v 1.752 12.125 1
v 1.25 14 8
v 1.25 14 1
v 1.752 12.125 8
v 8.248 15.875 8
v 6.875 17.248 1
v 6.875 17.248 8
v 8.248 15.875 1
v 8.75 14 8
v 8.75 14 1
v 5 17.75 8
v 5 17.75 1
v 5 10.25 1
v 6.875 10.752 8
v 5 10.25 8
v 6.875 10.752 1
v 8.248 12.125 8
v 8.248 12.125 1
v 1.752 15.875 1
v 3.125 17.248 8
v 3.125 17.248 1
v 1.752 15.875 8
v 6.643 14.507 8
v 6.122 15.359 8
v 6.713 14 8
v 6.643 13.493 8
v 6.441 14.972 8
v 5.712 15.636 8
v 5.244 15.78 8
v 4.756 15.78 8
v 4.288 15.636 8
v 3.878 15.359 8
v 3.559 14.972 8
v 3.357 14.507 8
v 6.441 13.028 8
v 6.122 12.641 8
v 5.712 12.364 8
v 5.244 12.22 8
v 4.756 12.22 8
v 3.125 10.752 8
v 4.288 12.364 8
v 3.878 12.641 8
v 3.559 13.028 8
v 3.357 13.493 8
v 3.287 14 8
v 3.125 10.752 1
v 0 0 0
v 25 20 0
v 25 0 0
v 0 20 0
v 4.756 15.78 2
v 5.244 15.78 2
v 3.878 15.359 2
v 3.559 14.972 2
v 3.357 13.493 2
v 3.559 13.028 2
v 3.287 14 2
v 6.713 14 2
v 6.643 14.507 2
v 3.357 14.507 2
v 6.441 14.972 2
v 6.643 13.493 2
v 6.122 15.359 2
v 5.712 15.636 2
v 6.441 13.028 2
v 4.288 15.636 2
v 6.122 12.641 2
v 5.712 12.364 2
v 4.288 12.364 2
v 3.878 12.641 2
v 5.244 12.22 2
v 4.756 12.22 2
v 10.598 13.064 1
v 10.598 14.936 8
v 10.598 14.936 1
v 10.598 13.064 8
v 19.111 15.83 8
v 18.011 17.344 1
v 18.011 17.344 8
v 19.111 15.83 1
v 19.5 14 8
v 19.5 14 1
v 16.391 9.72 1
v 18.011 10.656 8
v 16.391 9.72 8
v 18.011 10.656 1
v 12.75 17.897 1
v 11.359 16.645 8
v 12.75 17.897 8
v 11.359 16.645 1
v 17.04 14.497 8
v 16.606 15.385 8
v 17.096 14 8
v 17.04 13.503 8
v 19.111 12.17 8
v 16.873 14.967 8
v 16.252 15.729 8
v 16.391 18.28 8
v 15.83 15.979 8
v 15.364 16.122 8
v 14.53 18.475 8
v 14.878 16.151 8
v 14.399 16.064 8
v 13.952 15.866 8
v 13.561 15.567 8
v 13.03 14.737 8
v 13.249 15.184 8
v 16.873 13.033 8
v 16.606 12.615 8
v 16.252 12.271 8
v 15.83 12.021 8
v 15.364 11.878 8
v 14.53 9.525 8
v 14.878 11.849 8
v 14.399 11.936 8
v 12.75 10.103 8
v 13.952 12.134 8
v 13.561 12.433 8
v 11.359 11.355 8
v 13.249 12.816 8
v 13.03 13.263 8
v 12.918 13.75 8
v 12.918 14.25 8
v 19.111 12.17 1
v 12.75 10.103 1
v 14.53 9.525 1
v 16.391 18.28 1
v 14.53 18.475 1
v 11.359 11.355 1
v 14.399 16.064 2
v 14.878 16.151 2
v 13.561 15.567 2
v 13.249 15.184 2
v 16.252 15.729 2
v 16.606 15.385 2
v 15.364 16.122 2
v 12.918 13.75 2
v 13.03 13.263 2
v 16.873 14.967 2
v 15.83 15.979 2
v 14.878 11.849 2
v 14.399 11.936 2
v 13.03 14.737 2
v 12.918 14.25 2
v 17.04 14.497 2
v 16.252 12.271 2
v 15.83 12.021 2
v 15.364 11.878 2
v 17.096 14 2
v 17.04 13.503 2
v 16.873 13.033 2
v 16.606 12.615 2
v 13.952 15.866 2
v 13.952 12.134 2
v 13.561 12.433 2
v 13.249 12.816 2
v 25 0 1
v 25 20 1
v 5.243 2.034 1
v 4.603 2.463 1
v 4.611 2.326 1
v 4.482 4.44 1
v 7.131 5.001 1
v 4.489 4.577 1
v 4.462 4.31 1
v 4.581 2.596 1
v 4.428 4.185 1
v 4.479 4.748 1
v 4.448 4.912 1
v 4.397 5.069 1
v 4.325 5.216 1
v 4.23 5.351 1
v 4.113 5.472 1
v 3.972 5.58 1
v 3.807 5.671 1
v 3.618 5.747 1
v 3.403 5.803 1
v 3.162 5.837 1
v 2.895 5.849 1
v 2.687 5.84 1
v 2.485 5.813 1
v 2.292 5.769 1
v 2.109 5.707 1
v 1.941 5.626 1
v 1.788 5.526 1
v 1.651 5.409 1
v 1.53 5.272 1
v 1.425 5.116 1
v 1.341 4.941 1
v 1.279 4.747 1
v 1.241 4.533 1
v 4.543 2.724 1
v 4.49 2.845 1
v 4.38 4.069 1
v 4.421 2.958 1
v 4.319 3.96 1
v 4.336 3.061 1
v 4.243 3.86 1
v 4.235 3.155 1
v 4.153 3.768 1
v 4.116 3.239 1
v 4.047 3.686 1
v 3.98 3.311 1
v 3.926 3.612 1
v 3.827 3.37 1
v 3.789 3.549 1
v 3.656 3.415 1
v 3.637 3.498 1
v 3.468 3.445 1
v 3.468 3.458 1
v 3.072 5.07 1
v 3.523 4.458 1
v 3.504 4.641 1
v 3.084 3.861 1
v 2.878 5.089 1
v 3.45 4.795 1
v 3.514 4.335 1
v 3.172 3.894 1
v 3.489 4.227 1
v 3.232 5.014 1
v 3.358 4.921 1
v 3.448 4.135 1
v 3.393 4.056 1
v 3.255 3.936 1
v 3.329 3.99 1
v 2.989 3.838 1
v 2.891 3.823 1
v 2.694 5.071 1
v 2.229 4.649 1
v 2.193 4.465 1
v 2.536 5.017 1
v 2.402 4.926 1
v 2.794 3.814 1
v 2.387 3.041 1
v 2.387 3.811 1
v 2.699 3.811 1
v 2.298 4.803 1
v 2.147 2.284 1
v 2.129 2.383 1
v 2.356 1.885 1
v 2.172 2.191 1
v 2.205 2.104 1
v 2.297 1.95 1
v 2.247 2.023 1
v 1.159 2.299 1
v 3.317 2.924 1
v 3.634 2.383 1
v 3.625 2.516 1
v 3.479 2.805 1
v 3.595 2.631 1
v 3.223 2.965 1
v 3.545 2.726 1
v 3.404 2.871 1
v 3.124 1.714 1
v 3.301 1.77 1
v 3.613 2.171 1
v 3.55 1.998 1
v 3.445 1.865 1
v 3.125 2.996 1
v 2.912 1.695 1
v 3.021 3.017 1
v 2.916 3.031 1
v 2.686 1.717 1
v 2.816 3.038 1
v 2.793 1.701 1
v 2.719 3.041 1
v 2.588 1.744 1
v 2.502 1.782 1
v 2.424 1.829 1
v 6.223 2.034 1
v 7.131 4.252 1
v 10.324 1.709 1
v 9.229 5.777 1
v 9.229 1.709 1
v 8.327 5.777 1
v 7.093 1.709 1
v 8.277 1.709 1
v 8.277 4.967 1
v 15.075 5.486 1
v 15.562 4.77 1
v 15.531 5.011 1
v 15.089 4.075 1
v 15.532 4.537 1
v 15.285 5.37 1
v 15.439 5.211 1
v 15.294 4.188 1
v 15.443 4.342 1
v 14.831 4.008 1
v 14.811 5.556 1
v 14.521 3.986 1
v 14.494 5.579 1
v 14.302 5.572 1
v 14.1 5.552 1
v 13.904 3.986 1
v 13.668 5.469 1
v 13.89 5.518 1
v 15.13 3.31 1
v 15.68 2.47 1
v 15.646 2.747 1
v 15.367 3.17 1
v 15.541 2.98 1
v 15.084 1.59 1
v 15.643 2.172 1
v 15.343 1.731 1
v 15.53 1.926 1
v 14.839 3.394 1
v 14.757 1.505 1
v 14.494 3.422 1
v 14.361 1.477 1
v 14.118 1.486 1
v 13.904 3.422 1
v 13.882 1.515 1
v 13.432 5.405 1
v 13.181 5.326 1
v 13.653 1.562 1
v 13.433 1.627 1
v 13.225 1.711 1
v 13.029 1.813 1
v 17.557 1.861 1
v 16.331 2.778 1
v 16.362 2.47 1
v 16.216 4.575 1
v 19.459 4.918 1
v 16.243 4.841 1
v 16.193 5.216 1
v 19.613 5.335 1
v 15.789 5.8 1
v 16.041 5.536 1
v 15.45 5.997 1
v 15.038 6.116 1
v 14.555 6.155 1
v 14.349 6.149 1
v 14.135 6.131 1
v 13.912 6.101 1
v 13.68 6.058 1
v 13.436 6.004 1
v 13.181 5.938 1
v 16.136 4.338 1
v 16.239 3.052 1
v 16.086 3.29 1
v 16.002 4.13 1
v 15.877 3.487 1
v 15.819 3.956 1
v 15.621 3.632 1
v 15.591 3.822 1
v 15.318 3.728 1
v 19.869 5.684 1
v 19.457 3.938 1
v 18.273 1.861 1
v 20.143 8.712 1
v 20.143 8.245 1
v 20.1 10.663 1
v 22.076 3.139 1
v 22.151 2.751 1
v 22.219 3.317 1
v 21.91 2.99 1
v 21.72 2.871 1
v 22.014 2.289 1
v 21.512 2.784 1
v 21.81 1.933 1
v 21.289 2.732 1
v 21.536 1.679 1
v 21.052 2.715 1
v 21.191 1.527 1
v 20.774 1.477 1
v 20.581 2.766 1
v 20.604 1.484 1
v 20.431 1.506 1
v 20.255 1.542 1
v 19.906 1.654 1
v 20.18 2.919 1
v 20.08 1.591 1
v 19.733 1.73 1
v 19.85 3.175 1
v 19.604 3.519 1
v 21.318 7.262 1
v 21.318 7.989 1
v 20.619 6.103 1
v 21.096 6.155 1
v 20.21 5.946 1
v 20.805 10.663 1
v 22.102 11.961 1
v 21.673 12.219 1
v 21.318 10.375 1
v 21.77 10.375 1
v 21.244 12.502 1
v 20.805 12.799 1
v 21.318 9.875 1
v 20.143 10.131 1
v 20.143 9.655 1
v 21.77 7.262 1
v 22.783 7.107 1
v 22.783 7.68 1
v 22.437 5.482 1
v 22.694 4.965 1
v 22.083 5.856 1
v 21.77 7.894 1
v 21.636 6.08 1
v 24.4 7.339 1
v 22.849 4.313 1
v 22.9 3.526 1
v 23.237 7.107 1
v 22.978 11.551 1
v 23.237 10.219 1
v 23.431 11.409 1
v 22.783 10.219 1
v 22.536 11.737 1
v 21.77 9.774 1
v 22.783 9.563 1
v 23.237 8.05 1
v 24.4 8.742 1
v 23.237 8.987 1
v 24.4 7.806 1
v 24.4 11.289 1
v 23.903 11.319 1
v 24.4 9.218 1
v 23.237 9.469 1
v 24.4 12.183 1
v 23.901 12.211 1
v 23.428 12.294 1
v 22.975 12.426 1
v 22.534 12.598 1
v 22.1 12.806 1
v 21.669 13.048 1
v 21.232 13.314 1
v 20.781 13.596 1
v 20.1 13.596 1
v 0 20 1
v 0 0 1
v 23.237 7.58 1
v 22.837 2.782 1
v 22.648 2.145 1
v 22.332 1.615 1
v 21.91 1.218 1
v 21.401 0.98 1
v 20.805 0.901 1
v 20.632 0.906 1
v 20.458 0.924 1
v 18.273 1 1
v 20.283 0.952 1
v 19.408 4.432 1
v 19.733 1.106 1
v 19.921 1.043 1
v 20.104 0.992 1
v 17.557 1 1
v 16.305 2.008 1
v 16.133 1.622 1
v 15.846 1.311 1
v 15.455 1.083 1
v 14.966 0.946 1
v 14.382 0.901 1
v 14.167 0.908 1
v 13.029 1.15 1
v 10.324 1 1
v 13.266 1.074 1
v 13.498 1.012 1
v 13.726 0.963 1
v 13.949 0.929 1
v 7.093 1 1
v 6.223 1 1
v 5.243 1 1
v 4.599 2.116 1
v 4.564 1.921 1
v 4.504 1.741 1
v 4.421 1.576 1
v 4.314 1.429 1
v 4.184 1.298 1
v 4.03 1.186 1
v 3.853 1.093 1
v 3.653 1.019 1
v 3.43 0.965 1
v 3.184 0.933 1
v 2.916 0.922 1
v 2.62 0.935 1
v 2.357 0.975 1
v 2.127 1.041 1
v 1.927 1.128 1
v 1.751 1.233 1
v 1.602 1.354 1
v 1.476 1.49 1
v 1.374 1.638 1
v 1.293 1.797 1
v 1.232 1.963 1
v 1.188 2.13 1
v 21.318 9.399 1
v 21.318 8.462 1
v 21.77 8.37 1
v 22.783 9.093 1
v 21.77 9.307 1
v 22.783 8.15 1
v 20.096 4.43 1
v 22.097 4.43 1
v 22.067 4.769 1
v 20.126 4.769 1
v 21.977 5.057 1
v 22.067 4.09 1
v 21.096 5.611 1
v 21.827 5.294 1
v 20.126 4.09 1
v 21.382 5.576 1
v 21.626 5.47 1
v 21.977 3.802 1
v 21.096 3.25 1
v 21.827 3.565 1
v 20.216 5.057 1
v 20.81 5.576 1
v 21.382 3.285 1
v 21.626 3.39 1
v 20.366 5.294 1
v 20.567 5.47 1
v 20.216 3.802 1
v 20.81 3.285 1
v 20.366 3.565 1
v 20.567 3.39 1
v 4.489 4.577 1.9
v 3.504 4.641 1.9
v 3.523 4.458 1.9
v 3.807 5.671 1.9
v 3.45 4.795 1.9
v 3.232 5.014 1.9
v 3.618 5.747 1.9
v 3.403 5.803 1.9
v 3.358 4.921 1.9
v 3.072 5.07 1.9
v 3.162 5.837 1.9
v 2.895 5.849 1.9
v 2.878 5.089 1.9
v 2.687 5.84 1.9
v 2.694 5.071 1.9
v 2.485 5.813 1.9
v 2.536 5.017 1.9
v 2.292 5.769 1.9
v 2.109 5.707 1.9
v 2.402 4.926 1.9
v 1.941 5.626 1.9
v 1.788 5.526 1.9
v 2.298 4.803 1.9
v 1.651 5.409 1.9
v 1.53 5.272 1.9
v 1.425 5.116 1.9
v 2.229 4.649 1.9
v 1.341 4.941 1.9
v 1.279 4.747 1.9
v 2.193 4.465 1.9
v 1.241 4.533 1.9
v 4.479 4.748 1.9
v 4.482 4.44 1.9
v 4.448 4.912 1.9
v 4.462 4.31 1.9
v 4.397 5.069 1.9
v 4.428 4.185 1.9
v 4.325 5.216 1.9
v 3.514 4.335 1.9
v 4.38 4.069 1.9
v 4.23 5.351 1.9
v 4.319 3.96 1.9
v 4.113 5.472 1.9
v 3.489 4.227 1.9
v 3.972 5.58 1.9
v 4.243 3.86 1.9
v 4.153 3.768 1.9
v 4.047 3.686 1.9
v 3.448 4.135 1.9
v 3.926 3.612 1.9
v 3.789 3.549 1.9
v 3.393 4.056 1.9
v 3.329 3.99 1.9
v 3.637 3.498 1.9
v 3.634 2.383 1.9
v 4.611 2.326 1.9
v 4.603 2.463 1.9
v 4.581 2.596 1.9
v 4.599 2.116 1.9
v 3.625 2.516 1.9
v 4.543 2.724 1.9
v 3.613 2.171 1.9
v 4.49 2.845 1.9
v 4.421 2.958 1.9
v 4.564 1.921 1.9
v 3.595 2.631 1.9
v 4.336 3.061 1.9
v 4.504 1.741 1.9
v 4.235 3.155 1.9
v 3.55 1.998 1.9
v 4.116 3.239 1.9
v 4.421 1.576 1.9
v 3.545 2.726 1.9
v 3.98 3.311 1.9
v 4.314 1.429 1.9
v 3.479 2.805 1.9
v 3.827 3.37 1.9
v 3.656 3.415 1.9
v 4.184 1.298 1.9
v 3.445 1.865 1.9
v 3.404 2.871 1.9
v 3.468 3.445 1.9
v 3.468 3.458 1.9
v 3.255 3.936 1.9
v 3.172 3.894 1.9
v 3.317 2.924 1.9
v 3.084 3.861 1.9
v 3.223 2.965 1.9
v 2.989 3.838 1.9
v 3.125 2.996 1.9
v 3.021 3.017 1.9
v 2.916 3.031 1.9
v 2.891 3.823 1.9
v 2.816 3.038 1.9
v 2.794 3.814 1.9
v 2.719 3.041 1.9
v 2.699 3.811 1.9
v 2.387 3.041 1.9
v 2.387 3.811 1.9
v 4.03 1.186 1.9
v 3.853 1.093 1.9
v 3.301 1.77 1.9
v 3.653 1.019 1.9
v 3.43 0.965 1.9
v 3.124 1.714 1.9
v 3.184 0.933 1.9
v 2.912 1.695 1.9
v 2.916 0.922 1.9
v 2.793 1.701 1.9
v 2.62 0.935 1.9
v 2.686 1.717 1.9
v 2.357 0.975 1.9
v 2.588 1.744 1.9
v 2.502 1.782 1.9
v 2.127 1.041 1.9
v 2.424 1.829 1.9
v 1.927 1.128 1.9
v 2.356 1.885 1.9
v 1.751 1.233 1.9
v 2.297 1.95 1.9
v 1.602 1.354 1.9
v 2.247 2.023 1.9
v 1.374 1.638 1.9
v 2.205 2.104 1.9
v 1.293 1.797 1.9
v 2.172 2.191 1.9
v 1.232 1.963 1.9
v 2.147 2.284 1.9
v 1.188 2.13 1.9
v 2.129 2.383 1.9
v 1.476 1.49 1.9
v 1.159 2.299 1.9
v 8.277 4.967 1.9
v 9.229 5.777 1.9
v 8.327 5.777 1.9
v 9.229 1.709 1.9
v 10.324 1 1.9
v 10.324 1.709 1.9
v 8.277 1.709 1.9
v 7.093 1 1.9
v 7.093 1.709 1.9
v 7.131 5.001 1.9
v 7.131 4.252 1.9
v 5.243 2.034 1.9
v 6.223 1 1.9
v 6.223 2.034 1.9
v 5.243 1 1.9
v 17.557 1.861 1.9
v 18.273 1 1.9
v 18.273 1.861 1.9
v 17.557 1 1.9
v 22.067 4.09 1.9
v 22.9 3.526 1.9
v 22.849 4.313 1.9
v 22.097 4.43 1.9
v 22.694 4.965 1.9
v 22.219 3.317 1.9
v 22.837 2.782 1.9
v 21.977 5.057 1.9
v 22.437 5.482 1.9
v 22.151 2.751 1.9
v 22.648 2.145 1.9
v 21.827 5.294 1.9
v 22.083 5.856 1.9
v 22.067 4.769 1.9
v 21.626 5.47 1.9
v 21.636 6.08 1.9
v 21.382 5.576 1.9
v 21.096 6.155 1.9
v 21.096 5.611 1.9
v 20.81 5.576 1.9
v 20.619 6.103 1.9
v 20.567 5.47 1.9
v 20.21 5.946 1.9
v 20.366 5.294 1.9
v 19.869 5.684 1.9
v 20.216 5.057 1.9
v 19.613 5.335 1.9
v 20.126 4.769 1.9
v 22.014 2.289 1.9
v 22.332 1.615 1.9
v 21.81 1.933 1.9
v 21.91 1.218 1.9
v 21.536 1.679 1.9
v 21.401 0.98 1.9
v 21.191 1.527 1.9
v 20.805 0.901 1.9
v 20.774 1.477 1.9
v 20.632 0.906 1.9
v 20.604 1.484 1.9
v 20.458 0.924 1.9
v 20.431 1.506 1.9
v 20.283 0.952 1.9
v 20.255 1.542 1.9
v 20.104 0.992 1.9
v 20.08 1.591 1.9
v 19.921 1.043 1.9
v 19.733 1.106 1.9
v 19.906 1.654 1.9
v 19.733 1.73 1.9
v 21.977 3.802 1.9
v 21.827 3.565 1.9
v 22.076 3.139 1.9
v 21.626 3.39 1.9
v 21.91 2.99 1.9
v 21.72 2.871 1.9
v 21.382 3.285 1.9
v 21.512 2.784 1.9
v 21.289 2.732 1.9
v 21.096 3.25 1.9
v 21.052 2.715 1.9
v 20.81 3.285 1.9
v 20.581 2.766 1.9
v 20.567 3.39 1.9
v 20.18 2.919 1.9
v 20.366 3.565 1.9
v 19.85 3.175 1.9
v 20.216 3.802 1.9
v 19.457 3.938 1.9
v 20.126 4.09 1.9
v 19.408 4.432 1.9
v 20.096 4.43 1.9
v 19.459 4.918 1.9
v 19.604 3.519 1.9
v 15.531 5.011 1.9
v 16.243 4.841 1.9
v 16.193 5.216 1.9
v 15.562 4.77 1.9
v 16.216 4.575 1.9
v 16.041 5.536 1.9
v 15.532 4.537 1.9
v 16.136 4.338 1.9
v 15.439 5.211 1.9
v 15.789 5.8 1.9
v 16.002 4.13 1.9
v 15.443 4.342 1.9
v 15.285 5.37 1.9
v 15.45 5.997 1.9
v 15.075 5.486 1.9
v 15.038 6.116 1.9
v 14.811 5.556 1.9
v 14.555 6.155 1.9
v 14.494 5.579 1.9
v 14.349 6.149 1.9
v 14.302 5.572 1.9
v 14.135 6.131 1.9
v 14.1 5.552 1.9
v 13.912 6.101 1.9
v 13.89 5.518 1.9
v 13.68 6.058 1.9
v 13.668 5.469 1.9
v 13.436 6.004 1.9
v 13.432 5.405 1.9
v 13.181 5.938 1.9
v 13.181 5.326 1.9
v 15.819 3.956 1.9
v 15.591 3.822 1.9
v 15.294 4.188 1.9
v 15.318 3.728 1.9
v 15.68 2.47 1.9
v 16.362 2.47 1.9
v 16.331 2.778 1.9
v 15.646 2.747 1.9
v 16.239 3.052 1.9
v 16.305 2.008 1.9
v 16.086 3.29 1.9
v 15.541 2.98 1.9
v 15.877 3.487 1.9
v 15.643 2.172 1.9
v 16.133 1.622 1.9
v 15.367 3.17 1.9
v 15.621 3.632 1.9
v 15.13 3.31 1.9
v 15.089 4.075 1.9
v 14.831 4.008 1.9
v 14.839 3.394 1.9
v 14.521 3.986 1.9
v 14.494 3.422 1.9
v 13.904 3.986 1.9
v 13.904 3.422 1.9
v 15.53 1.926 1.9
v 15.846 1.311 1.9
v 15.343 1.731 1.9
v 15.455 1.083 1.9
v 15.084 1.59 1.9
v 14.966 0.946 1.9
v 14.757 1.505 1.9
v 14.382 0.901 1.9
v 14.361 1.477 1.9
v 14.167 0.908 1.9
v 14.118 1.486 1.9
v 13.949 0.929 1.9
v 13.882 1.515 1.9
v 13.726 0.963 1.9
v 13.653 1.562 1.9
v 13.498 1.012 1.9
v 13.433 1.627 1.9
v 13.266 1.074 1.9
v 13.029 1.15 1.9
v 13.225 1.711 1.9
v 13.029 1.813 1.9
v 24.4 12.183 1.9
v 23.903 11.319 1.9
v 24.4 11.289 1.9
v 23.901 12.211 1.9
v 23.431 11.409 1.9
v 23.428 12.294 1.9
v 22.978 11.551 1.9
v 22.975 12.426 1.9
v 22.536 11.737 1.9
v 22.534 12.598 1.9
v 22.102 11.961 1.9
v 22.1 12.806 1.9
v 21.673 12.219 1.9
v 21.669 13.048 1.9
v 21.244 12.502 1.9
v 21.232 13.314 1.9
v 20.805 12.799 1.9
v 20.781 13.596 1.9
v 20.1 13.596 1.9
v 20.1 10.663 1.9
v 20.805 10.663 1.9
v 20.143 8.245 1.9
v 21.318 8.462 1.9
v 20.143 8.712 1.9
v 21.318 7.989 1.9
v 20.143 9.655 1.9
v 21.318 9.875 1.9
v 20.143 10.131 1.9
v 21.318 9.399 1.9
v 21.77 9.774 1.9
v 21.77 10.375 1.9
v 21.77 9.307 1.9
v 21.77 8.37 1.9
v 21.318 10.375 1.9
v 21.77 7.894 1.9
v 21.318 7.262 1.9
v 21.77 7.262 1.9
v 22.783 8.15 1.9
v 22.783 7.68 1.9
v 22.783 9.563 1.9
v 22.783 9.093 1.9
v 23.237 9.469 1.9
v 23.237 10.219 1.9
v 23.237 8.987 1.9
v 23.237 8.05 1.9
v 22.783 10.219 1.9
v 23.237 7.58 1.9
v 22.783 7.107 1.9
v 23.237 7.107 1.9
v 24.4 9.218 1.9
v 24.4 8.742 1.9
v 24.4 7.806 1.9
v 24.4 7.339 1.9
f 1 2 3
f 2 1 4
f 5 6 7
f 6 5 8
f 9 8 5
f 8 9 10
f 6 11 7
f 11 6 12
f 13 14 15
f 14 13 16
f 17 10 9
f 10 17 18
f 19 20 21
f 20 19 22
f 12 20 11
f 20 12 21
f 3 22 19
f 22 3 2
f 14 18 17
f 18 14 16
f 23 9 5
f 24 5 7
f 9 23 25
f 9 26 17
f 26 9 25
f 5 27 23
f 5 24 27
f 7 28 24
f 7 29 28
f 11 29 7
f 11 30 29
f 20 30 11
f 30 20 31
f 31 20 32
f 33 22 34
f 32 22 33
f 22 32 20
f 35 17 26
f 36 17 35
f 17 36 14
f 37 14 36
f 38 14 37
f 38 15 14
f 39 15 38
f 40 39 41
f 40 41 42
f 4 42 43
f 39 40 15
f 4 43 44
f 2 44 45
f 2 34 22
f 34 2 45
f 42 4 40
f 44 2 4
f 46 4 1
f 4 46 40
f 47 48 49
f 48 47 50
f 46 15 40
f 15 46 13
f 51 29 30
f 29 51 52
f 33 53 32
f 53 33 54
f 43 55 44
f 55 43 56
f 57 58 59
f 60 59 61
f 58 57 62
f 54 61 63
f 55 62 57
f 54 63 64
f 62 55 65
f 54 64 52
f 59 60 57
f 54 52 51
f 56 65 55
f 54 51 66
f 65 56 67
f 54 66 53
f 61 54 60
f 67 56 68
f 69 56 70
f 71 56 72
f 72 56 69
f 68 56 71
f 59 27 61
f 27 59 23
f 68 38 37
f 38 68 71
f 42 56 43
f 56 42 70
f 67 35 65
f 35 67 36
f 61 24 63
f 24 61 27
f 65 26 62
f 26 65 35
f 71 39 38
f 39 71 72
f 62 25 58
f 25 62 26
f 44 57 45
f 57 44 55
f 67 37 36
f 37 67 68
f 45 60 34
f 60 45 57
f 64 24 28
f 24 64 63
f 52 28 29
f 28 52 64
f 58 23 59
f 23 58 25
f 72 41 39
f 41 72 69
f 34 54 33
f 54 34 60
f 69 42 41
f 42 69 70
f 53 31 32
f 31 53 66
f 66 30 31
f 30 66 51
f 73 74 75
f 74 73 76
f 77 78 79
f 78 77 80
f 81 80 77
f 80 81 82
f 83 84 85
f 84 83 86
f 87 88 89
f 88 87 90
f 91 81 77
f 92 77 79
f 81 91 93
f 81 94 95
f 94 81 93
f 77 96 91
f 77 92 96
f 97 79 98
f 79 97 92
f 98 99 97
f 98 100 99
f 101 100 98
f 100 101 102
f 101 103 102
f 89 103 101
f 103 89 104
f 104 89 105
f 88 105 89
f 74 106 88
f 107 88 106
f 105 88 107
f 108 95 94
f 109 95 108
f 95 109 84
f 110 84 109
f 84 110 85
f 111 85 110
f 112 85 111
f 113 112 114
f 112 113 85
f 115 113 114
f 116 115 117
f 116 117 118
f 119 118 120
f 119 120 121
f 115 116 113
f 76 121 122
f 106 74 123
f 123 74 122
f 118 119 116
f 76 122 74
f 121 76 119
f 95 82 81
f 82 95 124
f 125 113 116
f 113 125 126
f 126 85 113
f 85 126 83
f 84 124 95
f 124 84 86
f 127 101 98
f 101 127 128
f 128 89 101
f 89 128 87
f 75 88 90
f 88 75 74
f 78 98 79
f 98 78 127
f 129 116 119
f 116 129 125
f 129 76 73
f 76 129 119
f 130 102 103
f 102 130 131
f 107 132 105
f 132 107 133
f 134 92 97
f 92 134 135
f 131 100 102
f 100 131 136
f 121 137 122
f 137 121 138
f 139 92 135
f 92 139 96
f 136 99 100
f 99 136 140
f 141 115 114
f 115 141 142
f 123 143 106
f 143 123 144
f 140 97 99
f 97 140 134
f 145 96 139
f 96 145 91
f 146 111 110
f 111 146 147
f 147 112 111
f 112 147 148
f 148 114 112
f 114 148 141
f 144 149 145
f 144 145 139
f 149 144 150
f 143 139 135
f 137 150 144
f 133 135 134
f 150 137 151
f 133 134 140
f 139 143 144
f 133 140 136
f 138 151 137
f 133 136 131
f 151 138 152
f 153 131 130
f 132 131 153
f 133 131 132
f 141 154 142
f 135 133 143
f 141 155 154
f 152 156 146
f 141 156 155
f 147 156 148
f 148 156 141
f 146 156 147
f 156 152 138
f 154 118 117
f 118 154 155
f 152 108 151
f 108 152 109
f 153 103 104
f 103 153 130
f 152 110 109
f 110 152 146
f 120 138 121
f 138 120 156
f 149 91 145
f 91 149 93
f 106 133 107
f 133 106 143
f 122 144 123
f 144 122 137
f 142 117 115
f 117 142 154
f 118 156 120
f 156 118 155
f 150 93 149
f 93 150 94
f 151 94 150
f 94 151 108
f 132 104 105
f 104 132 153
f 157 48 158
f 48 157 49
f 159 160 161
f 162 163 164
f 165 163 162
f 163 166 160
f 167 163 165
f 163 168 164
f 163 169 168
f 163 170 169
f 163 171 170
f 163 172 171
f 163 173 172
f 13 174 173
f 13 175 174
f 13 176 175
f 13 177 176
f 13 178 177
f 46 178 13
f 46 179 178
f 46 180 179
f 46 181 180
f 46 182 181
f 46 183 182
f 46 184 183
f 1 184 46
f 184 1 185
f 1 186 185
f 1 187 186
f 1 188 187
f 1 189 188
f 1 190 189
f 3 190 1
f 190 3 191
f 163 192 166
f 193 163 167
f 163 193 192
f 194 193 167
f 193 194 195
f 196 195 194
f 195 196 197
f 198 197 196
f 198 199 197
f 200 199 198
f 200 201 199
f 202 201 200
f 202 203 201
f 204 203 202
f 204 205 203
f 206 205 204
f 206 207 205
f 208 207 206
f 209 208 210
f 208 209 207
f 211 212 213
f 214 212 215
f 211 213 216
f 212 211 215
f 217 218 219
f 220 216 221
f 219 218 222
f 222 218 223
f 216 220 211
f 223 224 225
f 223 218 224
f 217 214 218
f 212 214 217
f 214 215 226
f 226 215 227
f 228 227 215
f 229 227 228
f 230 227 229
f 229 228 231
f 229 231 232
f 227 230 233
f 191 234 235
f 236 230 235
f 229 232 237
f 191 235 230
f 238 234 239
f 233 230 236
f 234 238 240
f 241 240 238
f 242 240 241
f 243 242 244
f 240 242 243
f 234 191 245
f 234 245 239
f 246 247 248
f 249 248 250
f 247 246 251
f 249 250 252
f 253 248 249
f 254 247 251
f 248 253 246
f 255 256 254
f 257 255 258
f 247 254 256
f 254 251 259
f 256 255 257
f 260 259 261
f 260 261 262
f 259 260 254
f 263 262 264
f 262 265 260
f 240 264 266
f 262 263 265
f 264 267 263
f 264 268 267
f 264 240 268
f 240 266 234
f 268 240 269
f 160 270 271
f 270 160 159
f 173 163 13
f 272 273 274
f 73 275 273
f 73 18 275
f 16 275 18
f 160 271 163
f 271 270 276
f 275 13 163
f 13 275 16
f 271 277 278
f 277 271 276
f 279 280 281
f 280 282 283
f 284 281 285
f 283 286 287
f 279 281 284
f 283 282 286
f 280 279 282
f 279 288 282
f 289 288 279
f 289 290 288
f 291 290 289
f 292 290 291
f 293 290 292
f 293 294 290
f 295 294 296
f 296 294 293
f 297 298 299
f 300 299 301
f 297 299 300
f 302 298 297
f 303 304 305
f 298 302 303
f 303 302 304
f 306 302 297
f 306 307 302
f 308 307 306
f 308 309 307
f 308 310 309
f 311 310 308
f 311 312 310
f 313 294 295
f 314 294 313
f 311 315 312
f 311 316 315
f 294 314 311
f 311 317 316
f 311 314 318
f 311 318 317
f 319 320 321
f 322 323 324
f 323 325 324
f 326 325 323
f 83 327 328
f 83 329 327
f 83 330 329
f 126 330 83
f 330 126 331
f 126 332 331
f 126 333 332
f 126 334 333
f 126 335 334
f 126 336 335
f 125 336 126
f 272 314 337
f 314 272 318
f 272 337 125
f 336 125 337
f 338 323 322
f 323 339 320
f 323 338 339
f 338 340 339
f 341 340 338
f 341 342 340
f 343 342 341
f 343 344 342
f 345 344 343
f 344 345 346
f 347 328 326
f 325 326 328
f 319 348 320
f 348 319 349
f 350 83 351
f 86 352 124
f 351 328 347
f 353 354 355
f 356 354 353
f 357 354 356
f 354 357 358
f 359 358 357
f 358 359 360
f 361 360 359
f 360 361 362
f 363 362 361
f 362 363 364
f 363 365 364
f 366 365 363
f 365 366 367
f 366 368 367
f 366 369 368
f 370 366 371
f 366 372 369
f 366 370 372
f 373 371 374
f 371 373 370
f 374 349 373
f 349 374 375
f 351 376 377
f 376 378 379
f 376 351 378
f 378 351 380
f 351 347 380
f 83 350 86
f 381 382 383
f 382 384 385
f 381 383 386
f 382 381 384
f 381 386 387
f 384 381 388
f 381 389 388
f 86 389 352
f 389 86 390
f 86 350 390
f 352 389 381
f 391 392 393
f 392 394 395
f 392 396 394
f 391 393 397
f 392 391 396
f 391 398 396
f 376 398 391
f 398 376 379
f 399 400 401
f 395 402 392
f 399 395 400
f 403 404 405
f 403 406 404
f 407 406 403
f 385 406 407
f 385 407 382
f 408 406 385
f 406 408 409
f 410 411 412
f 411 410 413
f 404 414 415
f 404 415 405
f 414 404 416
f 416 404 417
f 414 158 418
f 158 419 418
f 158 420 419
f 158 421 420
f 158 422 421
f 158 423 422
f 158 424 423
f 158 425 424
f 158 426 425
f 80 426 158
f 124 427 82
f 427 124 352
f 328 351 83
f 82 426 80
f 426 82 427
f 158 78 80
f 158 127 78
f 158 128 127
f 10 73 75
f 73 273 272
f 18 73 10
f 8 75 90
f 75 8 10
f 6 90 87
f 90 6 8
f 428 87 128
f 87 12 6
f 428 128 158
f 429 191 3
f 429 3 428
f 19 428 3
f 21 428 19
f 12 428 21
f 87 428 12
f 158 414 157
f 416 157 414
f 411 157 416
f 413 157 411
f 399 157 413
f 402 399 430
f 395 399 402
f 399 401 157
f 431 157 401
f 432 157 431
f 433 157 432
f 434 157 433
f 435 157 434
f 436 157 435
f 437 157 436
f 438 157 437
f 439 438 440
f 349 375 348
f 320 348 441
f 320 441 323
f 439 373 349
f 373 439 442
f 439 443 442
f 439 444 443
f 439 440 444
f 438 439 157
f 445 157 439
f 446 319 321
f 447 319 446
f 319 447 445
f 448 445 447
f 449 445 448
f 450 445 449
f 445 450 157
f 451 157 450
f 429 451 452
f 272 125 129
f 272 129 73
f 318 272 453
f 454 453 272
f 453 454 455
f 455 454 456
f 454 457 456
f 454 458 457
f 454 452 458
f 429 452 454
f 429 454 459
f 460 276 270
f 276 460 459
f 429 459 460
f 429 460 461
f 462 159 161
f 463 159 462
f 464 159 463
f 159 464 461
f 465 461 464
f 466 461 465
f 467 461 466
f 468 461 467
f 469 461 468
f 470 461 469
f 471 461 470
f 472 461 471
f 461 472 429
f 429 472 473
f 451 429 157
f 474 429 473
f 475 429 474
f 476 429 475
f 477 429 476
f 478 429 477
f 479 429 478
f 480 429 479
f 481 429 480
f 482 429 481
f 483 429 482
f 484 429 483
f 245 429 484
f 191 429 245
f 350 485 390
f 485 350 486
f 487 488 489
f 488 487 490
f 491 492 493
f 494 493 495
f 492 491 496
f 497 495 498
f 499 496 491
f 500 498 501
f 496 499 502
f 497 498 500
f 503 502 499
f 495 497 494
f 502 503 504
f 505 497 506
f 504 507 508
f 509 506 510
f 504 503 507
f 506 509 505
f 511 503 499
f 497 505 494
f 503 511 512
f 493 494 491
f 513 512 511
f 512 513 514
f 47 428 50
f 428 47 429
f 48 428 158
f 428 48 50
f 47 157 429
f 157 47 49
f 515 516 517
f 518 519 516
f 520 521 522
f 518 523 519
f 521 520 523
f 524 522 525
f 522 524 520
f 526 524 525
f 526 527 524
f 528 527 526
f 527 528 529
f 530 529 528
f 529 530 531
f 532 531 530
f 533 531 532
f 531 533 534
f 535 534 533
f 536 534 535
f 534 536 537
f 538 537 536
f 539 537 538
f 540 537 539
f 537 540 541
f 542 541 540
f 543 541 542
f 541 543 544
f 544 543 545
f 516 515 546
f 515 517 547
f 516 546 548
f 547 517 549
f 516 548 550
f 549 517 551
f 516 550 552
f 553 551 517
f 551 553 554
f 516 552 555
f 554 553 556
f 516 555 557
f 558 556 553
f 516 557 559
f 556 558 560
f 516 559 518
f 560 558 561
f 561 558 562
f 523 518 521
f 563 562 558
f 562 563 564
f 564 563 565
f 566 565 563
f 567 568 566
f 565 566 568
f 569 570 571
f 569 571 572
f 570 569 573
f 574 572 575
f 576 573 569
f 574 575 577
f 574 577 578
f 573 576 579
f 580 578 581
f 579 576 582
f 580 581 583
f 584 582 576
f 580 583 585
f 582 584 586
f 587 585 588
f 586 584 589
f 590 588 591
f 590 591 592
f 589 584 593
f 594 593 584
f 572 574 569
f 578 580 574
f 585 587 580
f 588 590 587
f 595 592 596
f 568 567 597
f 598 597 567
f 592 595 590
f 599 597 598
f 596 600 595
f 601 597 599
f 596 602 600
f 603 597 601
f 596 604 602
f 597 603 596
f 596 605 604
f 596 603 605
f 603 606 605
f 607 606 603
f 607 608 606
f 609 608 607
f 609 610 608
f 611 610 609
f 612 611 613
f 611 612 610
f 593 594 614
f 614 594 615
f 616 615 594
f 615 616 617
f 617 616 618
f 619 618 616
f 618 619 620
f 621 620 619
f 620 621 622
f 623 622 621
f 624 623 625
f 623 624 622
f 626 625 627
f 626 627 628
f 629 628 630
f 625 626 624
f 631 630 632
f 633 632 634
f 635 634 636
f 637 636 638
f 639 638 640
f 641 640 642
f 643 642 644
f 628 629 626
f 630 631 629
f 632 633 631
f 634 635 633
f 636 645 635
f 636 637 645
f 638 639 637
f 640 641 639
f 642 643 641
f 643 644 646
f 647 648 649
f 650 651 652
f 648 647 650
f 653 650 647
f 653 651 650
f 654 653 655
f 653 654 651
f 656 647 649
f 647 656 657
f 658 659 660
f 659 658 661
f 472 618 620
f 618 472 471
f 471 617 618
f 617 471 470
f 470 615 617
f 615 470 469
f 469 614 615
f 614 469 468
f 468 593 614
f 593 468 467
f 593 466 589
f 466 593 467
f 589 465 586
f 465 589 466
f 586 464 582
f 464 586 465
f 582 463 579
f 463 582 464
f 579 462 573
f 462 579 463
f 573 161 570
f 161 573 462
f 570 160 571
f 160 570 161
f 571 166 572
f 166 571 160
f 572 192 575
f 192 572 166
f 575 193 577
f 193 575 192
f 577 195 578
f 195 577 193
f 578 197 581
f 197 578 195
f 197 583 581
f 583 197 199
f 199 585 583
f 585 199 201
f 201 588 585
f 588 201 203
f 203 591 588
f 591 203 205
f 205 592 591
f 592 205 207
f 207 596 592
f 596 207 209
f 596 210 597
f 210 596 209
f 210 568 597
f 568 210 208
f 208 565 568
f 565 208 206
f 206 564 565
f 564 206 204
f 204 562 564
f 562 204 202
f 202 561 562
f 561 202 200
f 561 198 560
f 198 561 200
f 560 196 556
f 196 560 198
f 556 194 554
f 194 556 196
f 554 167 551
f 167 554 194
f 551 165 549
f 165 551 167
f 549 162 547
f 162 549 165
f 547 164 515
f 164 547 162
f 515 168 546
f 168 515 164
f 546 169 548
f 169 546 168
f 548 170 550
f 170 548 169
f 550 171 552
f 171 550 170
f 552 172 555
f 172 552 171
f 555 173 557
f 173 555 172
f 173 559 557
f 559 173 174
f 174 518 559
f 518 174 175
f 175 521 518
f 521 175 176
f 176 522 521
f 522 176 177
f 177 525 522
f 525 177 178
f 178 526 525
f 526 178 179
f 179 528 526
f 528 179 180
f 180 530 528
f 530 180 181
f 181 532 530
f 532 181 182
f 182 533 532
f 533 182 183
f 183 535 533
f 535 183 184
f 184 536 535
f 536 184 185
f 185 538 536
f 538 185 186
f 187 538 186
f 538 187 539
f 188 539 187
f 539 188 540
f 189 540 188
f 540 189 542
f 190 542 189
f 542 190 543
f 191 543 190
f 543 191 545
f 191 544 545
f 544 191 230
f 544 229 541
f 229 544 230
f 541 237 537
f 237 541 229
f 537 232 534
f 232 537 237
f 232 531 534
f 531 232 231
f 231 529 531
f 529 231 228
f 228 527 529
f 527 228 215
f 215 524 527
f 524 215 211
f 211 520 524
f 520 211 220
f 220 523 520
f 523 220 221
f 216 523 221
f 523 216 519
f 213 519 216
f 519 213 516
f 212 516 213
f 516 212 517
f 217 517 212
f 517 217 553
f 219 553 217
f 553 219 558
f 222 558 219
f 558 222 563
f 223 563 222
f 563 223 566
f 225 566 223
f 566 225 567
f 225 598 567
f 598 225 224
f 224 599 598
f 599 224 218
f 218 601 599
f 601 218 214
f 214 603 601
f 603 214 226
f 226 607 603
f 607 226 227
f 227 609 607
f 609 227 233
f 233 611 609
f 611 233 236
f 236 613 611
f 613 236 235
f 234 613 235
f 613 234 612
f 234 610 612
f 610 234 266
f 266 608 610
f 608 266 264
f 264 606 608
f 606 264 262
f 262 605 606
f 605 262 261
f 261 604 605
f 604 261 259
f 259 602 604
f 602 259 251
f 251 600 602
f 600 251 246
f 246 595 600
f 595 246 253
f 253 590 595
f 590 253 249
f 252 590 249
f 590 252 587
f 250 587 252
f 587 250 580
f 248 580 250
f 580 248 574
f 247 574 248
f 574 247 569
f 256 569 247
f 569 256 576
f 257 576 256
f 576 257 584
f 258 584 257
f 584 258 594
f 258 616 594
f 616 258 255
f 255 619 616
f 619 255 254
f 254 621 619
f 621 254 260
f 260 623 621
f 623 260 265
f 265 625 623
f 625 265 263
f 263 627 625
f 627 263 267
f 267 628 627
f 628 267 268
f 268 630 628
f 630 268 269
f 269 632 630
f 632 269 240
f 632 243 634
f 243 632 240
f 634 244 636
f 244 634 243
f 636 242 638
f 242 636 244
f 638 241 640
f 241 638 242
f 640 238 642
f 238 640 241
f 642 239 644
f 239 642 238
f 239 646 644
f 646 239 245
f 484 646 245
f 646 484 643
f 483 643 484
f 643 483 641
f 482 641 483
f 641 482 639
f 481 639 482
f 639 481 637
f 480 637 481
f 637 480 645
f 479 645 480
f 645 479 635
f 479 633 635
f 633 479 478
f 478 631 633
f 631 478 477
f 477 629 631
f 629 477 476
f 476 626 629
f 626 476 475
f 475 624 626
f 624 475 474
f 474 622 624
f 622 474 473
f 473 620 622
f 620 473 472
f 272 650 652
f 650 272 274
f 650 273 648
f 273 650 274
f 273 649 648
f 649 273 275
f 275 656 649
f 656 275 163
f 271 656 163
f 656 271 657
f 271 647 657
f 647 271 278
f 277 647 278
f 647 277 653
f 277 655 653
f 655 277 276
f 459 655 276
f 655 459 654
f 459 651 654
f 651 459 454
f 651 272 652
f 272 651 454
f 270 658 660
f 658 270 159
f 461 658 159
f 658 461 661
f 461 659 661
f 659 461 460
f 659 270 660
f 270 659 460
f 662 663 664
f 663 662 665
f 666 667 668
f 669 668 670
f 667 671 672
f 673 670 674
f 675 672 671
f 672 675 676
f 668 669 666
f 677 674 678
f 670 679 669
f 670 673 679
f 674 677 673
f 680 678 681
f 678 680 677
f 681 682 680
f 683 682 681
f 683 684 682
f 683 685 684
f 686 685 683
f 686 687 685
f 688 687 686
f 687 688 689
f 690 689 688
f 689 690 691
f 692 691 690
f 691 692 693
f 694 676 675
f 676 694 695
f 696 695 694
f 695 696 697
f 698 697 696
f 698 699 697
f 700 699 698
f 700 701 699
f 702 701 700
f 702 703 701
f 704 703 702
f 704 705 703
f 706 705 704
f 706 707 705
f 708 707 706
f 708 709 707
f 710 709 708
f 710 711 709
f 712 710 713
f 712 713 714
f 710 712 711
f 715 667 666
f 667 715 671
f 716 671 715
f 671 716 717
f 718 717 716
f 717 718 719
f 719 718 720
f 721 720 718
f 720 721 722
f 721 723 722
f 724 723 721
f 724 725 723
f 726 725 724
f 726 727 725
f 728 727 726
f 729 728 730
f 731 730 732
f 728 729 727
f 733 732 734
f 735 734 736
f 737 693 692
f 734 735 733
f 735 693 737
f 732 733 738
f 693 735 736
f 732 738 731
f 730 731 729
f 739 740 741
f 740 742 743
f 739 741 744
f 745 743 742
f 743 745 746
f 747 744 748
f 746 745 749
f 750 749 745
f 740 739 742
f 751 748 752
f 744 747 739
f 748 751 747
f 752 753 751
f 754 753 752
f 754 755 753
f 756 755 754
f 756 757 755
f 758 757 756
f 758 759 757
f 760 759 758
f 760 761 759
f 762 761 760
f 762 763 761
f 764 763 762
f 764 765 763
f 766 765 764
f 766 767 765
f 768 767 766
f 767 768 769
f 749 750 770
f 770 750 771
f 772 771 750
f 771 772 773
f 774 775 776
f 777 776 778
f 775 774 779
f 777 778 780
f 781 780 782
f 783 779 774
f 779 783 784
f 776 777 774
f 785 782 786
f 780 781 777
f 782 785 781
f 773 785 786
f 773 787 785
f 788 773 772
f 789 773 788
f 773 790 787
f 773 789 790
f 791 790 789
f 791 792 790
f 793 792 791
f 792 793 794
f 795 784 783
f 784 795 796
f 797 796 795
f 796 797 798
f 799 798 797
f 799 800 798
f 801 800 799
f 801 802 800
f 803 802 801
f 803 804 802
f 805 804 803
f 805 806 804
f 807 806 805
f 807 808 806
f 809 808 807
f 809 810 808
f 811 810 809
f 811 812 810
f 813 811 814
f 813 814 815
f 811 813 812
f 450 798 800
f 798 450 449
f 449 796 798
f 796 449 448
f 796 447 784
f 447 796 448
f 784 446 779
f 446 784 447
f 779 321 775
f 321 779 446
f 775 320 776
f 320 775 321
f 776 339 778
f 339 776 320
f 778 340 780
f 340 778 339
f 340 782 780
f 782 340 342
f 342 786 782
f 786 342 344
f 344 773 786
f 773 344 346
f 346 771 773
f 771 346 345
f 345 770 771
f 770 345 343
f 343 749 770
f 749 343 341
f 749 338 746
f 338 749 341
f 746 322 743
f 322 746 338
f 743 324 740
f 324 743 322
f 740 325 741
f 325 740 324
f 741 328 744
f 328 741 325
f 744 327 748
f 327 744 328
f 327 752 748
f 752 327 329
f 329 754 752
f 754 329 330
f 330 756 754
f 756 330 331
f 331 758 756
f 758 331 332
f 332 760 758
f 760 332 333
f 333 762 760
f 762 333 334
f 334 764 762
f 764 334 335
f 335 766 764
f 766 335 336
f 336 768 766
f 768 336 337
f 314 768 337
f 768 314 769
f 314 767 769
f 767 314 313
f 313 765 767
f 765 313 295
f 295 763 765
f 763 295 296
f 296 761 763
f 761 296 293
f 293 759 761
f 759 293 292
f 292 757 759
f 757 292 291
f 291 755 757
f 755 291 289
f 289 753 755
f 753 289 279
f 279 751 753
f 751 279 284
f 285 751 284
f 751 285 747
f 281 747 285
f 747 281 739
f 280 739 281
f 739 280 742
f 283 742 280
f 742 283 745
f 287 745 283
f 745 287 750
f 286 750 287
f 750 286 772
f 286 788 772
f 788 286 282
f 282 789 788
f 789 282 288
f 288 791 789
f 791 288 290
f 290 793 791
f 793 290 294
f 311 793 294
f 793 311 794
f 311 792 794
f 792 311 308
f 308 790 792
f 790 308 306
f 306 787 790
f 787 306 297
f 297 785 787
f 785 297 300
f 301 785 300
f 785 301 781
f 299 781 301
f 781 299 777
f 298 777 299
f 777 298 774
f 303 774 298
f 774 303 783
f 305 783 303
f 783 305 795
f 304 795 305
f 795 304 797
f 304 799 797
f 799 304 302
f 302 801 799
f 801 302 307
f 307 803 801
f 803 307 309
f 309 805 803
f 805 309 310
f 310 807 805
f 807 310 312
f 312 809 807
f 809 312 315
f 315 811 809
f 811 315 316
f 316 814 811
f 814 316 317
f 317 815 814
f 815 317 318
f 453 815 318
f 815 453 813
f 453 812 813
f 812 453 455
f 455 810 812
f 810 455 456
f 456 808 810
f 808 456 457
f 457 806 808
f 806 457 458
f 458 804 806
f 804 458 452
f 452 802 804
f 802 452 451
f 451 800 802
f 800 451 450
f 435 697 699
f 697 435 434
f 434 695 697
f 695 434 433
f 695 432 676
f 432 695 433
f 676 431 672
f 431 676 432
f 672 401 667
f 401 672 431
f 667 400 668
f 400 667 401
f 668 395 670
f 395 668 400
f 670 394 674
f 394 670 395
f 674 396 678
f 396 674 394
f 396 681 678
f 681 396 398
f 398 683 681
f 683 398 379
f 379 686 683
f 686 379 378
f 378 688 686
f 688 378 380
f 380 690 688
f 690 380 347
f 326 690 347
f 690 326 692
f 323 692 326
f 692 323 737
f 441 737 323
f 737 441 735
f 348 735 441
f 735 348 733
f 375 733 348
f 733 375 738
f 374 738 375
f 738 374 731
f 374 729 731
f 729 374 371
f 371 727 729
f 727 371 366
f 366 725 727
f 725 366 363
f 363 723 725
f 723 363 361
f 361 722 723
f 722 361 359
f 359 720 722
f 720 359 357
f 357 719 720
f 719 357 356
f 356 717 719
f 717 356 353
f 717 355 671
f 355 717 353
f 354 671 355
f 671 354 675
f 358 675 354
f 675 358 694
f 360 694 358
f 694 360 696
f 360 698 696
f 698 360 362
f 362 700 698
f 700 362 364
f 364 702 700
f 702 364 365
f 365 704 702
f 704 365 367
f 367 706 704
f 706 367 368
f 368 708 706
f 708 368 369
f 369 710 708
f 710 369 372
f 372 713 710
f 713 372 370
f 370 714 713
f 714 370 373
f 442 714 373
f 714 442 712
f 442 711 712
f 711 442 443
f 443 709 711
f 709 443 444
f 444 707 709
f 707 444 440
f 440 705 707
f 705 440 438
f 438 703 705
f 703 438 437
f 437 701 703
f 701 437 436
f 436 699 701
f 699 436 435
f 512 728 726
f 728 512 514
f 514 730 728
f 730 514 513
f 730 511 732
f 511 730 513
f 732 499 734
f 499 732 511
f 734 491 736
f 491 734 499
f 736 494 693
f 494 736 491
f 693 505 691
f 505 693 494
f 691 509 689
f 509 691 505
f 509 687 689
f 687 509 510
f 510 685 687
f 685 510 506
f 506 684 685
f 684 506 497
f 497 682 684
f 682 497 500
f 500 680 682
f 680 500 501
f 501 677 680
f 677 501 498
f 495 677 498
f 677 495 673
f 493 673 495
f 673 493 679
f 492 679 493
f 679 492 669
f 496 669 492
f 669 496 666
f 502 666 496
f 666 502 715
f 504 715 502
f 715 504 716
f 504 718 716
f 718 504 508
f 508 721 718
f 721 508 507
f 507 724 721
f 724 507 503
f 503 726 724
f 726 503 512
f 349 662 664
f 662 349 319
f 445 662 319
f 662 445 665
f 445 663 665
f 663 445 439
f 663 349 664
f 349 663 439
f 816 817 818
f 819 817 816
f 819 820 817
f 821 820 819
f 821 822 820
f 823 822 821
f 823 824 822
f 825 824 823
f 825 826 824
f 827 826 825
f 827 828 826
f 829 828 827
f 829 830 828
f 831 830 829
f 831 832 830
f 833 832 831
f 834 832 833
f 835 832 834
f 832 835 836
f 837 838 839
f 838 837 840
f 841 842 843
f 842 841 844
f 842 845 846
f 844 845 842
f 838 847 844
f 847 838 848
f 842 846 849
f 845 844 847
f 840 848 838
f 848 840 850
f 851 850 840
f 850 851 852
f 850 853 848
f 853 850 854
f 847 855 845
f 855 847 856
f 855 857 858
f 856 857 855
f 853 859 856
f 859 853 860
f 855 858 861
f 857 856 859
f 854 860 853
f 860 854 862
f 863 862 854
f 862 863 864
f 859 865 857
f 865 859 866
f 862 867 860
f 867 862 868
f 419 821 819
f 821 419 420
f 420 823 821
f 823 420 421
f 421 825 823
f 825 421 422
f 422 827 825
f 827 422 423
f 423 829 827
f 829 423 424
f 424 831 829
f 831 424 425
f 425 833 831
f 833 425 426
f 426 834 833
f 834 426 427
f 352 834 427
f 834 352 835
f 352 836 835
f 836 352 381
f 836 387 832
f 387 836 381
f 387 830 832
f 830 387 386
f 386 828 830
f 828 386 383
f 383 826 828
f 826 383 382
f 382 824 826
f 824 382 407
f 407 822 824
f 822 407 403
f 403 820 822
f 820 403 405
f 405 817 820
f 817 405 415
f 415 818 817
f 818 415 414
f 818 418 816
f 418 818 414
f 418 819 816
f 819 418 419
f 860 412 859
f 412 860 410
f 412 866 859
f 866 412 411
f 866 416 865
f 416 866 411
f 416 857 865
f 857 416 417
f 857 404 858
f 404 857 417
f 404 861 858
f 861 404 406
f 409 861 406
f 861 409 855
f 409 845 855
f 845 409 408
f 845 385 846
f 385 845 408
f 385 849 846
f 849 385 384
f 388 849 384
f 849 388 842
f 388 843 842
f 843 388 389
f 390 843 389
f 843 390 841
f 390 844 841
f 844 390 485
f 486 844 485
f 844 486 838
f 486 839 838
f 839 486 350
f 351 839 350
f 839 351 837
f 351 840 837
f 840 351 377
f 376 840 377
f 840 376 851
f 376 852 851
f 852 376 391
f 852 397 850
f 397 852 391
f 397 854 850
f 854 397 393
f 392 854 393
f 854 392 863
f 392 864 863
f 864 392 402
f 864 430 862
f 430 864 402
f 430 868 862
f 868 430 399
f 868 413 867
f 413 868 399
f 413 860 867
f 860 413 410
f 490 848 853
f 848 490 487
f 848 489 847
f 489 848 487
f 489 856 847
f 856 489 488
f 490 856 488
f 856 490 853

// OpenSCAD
base_x = 25;
base_y = 20;
base_thickness = 1;

// Make the hole eliptical to compensate for the way it prints.

module hole(diameter, depth, along_across_ratio = 1.025) {
    linear_extrude(depth+0.1)
        scale([1, along_across_ratio]) 
            circle(d = diameter, $fa=1, $fs=0.5);
}

module standoff(x, y, height, diameter, hole_diameter, hole_depth, diameter_expansion = 1.08, x_y_ratio) {
    translate([x, y, 0]) difference() {
        cylinder(h=height, d=diameter);
        translate([0, 0, height-hole_depth]) 
            hole(hole_diameter*diameter_expansion, hole_depth, x_y_ratio);
//            cylinder(h=hole_depth+.01, d=hole_diameter, $fa=1, $fs=0.5);
    }
}

standoff_y = 14;
standoff_h = 8;
hole_depth = 6;
text_height = 1;
text_base = base_thickness - 0.1;

union() {
    cube([base_x, base_y, base_thickness]);
    standoff(5, standoff_y, standoff_h, 7.5, 3.1, hole_depth, diameter_expansion = 1.105, x_y_ratio=1.05);
    translate([1, 1, text_base]) linear_extrude(text_height) text("3.1", 5, font="Arial:style=Bold");
    
    standoff(15, standoff_y, standoff_h, 9, 3.9, hole_depth, diameter_expansion = 1.075, x_y_ratio=1.028);
    translate([12.5, 1, text_base]) linear_extrude(text_height) text("3.9", 5, font="Gil Sans Ultra Bold");
    
    rotate(90) translate([7, -24.4, text_base]) linear_extrude(text_height) text("#7", 4.5, font="Arial:style=Bold");
}
